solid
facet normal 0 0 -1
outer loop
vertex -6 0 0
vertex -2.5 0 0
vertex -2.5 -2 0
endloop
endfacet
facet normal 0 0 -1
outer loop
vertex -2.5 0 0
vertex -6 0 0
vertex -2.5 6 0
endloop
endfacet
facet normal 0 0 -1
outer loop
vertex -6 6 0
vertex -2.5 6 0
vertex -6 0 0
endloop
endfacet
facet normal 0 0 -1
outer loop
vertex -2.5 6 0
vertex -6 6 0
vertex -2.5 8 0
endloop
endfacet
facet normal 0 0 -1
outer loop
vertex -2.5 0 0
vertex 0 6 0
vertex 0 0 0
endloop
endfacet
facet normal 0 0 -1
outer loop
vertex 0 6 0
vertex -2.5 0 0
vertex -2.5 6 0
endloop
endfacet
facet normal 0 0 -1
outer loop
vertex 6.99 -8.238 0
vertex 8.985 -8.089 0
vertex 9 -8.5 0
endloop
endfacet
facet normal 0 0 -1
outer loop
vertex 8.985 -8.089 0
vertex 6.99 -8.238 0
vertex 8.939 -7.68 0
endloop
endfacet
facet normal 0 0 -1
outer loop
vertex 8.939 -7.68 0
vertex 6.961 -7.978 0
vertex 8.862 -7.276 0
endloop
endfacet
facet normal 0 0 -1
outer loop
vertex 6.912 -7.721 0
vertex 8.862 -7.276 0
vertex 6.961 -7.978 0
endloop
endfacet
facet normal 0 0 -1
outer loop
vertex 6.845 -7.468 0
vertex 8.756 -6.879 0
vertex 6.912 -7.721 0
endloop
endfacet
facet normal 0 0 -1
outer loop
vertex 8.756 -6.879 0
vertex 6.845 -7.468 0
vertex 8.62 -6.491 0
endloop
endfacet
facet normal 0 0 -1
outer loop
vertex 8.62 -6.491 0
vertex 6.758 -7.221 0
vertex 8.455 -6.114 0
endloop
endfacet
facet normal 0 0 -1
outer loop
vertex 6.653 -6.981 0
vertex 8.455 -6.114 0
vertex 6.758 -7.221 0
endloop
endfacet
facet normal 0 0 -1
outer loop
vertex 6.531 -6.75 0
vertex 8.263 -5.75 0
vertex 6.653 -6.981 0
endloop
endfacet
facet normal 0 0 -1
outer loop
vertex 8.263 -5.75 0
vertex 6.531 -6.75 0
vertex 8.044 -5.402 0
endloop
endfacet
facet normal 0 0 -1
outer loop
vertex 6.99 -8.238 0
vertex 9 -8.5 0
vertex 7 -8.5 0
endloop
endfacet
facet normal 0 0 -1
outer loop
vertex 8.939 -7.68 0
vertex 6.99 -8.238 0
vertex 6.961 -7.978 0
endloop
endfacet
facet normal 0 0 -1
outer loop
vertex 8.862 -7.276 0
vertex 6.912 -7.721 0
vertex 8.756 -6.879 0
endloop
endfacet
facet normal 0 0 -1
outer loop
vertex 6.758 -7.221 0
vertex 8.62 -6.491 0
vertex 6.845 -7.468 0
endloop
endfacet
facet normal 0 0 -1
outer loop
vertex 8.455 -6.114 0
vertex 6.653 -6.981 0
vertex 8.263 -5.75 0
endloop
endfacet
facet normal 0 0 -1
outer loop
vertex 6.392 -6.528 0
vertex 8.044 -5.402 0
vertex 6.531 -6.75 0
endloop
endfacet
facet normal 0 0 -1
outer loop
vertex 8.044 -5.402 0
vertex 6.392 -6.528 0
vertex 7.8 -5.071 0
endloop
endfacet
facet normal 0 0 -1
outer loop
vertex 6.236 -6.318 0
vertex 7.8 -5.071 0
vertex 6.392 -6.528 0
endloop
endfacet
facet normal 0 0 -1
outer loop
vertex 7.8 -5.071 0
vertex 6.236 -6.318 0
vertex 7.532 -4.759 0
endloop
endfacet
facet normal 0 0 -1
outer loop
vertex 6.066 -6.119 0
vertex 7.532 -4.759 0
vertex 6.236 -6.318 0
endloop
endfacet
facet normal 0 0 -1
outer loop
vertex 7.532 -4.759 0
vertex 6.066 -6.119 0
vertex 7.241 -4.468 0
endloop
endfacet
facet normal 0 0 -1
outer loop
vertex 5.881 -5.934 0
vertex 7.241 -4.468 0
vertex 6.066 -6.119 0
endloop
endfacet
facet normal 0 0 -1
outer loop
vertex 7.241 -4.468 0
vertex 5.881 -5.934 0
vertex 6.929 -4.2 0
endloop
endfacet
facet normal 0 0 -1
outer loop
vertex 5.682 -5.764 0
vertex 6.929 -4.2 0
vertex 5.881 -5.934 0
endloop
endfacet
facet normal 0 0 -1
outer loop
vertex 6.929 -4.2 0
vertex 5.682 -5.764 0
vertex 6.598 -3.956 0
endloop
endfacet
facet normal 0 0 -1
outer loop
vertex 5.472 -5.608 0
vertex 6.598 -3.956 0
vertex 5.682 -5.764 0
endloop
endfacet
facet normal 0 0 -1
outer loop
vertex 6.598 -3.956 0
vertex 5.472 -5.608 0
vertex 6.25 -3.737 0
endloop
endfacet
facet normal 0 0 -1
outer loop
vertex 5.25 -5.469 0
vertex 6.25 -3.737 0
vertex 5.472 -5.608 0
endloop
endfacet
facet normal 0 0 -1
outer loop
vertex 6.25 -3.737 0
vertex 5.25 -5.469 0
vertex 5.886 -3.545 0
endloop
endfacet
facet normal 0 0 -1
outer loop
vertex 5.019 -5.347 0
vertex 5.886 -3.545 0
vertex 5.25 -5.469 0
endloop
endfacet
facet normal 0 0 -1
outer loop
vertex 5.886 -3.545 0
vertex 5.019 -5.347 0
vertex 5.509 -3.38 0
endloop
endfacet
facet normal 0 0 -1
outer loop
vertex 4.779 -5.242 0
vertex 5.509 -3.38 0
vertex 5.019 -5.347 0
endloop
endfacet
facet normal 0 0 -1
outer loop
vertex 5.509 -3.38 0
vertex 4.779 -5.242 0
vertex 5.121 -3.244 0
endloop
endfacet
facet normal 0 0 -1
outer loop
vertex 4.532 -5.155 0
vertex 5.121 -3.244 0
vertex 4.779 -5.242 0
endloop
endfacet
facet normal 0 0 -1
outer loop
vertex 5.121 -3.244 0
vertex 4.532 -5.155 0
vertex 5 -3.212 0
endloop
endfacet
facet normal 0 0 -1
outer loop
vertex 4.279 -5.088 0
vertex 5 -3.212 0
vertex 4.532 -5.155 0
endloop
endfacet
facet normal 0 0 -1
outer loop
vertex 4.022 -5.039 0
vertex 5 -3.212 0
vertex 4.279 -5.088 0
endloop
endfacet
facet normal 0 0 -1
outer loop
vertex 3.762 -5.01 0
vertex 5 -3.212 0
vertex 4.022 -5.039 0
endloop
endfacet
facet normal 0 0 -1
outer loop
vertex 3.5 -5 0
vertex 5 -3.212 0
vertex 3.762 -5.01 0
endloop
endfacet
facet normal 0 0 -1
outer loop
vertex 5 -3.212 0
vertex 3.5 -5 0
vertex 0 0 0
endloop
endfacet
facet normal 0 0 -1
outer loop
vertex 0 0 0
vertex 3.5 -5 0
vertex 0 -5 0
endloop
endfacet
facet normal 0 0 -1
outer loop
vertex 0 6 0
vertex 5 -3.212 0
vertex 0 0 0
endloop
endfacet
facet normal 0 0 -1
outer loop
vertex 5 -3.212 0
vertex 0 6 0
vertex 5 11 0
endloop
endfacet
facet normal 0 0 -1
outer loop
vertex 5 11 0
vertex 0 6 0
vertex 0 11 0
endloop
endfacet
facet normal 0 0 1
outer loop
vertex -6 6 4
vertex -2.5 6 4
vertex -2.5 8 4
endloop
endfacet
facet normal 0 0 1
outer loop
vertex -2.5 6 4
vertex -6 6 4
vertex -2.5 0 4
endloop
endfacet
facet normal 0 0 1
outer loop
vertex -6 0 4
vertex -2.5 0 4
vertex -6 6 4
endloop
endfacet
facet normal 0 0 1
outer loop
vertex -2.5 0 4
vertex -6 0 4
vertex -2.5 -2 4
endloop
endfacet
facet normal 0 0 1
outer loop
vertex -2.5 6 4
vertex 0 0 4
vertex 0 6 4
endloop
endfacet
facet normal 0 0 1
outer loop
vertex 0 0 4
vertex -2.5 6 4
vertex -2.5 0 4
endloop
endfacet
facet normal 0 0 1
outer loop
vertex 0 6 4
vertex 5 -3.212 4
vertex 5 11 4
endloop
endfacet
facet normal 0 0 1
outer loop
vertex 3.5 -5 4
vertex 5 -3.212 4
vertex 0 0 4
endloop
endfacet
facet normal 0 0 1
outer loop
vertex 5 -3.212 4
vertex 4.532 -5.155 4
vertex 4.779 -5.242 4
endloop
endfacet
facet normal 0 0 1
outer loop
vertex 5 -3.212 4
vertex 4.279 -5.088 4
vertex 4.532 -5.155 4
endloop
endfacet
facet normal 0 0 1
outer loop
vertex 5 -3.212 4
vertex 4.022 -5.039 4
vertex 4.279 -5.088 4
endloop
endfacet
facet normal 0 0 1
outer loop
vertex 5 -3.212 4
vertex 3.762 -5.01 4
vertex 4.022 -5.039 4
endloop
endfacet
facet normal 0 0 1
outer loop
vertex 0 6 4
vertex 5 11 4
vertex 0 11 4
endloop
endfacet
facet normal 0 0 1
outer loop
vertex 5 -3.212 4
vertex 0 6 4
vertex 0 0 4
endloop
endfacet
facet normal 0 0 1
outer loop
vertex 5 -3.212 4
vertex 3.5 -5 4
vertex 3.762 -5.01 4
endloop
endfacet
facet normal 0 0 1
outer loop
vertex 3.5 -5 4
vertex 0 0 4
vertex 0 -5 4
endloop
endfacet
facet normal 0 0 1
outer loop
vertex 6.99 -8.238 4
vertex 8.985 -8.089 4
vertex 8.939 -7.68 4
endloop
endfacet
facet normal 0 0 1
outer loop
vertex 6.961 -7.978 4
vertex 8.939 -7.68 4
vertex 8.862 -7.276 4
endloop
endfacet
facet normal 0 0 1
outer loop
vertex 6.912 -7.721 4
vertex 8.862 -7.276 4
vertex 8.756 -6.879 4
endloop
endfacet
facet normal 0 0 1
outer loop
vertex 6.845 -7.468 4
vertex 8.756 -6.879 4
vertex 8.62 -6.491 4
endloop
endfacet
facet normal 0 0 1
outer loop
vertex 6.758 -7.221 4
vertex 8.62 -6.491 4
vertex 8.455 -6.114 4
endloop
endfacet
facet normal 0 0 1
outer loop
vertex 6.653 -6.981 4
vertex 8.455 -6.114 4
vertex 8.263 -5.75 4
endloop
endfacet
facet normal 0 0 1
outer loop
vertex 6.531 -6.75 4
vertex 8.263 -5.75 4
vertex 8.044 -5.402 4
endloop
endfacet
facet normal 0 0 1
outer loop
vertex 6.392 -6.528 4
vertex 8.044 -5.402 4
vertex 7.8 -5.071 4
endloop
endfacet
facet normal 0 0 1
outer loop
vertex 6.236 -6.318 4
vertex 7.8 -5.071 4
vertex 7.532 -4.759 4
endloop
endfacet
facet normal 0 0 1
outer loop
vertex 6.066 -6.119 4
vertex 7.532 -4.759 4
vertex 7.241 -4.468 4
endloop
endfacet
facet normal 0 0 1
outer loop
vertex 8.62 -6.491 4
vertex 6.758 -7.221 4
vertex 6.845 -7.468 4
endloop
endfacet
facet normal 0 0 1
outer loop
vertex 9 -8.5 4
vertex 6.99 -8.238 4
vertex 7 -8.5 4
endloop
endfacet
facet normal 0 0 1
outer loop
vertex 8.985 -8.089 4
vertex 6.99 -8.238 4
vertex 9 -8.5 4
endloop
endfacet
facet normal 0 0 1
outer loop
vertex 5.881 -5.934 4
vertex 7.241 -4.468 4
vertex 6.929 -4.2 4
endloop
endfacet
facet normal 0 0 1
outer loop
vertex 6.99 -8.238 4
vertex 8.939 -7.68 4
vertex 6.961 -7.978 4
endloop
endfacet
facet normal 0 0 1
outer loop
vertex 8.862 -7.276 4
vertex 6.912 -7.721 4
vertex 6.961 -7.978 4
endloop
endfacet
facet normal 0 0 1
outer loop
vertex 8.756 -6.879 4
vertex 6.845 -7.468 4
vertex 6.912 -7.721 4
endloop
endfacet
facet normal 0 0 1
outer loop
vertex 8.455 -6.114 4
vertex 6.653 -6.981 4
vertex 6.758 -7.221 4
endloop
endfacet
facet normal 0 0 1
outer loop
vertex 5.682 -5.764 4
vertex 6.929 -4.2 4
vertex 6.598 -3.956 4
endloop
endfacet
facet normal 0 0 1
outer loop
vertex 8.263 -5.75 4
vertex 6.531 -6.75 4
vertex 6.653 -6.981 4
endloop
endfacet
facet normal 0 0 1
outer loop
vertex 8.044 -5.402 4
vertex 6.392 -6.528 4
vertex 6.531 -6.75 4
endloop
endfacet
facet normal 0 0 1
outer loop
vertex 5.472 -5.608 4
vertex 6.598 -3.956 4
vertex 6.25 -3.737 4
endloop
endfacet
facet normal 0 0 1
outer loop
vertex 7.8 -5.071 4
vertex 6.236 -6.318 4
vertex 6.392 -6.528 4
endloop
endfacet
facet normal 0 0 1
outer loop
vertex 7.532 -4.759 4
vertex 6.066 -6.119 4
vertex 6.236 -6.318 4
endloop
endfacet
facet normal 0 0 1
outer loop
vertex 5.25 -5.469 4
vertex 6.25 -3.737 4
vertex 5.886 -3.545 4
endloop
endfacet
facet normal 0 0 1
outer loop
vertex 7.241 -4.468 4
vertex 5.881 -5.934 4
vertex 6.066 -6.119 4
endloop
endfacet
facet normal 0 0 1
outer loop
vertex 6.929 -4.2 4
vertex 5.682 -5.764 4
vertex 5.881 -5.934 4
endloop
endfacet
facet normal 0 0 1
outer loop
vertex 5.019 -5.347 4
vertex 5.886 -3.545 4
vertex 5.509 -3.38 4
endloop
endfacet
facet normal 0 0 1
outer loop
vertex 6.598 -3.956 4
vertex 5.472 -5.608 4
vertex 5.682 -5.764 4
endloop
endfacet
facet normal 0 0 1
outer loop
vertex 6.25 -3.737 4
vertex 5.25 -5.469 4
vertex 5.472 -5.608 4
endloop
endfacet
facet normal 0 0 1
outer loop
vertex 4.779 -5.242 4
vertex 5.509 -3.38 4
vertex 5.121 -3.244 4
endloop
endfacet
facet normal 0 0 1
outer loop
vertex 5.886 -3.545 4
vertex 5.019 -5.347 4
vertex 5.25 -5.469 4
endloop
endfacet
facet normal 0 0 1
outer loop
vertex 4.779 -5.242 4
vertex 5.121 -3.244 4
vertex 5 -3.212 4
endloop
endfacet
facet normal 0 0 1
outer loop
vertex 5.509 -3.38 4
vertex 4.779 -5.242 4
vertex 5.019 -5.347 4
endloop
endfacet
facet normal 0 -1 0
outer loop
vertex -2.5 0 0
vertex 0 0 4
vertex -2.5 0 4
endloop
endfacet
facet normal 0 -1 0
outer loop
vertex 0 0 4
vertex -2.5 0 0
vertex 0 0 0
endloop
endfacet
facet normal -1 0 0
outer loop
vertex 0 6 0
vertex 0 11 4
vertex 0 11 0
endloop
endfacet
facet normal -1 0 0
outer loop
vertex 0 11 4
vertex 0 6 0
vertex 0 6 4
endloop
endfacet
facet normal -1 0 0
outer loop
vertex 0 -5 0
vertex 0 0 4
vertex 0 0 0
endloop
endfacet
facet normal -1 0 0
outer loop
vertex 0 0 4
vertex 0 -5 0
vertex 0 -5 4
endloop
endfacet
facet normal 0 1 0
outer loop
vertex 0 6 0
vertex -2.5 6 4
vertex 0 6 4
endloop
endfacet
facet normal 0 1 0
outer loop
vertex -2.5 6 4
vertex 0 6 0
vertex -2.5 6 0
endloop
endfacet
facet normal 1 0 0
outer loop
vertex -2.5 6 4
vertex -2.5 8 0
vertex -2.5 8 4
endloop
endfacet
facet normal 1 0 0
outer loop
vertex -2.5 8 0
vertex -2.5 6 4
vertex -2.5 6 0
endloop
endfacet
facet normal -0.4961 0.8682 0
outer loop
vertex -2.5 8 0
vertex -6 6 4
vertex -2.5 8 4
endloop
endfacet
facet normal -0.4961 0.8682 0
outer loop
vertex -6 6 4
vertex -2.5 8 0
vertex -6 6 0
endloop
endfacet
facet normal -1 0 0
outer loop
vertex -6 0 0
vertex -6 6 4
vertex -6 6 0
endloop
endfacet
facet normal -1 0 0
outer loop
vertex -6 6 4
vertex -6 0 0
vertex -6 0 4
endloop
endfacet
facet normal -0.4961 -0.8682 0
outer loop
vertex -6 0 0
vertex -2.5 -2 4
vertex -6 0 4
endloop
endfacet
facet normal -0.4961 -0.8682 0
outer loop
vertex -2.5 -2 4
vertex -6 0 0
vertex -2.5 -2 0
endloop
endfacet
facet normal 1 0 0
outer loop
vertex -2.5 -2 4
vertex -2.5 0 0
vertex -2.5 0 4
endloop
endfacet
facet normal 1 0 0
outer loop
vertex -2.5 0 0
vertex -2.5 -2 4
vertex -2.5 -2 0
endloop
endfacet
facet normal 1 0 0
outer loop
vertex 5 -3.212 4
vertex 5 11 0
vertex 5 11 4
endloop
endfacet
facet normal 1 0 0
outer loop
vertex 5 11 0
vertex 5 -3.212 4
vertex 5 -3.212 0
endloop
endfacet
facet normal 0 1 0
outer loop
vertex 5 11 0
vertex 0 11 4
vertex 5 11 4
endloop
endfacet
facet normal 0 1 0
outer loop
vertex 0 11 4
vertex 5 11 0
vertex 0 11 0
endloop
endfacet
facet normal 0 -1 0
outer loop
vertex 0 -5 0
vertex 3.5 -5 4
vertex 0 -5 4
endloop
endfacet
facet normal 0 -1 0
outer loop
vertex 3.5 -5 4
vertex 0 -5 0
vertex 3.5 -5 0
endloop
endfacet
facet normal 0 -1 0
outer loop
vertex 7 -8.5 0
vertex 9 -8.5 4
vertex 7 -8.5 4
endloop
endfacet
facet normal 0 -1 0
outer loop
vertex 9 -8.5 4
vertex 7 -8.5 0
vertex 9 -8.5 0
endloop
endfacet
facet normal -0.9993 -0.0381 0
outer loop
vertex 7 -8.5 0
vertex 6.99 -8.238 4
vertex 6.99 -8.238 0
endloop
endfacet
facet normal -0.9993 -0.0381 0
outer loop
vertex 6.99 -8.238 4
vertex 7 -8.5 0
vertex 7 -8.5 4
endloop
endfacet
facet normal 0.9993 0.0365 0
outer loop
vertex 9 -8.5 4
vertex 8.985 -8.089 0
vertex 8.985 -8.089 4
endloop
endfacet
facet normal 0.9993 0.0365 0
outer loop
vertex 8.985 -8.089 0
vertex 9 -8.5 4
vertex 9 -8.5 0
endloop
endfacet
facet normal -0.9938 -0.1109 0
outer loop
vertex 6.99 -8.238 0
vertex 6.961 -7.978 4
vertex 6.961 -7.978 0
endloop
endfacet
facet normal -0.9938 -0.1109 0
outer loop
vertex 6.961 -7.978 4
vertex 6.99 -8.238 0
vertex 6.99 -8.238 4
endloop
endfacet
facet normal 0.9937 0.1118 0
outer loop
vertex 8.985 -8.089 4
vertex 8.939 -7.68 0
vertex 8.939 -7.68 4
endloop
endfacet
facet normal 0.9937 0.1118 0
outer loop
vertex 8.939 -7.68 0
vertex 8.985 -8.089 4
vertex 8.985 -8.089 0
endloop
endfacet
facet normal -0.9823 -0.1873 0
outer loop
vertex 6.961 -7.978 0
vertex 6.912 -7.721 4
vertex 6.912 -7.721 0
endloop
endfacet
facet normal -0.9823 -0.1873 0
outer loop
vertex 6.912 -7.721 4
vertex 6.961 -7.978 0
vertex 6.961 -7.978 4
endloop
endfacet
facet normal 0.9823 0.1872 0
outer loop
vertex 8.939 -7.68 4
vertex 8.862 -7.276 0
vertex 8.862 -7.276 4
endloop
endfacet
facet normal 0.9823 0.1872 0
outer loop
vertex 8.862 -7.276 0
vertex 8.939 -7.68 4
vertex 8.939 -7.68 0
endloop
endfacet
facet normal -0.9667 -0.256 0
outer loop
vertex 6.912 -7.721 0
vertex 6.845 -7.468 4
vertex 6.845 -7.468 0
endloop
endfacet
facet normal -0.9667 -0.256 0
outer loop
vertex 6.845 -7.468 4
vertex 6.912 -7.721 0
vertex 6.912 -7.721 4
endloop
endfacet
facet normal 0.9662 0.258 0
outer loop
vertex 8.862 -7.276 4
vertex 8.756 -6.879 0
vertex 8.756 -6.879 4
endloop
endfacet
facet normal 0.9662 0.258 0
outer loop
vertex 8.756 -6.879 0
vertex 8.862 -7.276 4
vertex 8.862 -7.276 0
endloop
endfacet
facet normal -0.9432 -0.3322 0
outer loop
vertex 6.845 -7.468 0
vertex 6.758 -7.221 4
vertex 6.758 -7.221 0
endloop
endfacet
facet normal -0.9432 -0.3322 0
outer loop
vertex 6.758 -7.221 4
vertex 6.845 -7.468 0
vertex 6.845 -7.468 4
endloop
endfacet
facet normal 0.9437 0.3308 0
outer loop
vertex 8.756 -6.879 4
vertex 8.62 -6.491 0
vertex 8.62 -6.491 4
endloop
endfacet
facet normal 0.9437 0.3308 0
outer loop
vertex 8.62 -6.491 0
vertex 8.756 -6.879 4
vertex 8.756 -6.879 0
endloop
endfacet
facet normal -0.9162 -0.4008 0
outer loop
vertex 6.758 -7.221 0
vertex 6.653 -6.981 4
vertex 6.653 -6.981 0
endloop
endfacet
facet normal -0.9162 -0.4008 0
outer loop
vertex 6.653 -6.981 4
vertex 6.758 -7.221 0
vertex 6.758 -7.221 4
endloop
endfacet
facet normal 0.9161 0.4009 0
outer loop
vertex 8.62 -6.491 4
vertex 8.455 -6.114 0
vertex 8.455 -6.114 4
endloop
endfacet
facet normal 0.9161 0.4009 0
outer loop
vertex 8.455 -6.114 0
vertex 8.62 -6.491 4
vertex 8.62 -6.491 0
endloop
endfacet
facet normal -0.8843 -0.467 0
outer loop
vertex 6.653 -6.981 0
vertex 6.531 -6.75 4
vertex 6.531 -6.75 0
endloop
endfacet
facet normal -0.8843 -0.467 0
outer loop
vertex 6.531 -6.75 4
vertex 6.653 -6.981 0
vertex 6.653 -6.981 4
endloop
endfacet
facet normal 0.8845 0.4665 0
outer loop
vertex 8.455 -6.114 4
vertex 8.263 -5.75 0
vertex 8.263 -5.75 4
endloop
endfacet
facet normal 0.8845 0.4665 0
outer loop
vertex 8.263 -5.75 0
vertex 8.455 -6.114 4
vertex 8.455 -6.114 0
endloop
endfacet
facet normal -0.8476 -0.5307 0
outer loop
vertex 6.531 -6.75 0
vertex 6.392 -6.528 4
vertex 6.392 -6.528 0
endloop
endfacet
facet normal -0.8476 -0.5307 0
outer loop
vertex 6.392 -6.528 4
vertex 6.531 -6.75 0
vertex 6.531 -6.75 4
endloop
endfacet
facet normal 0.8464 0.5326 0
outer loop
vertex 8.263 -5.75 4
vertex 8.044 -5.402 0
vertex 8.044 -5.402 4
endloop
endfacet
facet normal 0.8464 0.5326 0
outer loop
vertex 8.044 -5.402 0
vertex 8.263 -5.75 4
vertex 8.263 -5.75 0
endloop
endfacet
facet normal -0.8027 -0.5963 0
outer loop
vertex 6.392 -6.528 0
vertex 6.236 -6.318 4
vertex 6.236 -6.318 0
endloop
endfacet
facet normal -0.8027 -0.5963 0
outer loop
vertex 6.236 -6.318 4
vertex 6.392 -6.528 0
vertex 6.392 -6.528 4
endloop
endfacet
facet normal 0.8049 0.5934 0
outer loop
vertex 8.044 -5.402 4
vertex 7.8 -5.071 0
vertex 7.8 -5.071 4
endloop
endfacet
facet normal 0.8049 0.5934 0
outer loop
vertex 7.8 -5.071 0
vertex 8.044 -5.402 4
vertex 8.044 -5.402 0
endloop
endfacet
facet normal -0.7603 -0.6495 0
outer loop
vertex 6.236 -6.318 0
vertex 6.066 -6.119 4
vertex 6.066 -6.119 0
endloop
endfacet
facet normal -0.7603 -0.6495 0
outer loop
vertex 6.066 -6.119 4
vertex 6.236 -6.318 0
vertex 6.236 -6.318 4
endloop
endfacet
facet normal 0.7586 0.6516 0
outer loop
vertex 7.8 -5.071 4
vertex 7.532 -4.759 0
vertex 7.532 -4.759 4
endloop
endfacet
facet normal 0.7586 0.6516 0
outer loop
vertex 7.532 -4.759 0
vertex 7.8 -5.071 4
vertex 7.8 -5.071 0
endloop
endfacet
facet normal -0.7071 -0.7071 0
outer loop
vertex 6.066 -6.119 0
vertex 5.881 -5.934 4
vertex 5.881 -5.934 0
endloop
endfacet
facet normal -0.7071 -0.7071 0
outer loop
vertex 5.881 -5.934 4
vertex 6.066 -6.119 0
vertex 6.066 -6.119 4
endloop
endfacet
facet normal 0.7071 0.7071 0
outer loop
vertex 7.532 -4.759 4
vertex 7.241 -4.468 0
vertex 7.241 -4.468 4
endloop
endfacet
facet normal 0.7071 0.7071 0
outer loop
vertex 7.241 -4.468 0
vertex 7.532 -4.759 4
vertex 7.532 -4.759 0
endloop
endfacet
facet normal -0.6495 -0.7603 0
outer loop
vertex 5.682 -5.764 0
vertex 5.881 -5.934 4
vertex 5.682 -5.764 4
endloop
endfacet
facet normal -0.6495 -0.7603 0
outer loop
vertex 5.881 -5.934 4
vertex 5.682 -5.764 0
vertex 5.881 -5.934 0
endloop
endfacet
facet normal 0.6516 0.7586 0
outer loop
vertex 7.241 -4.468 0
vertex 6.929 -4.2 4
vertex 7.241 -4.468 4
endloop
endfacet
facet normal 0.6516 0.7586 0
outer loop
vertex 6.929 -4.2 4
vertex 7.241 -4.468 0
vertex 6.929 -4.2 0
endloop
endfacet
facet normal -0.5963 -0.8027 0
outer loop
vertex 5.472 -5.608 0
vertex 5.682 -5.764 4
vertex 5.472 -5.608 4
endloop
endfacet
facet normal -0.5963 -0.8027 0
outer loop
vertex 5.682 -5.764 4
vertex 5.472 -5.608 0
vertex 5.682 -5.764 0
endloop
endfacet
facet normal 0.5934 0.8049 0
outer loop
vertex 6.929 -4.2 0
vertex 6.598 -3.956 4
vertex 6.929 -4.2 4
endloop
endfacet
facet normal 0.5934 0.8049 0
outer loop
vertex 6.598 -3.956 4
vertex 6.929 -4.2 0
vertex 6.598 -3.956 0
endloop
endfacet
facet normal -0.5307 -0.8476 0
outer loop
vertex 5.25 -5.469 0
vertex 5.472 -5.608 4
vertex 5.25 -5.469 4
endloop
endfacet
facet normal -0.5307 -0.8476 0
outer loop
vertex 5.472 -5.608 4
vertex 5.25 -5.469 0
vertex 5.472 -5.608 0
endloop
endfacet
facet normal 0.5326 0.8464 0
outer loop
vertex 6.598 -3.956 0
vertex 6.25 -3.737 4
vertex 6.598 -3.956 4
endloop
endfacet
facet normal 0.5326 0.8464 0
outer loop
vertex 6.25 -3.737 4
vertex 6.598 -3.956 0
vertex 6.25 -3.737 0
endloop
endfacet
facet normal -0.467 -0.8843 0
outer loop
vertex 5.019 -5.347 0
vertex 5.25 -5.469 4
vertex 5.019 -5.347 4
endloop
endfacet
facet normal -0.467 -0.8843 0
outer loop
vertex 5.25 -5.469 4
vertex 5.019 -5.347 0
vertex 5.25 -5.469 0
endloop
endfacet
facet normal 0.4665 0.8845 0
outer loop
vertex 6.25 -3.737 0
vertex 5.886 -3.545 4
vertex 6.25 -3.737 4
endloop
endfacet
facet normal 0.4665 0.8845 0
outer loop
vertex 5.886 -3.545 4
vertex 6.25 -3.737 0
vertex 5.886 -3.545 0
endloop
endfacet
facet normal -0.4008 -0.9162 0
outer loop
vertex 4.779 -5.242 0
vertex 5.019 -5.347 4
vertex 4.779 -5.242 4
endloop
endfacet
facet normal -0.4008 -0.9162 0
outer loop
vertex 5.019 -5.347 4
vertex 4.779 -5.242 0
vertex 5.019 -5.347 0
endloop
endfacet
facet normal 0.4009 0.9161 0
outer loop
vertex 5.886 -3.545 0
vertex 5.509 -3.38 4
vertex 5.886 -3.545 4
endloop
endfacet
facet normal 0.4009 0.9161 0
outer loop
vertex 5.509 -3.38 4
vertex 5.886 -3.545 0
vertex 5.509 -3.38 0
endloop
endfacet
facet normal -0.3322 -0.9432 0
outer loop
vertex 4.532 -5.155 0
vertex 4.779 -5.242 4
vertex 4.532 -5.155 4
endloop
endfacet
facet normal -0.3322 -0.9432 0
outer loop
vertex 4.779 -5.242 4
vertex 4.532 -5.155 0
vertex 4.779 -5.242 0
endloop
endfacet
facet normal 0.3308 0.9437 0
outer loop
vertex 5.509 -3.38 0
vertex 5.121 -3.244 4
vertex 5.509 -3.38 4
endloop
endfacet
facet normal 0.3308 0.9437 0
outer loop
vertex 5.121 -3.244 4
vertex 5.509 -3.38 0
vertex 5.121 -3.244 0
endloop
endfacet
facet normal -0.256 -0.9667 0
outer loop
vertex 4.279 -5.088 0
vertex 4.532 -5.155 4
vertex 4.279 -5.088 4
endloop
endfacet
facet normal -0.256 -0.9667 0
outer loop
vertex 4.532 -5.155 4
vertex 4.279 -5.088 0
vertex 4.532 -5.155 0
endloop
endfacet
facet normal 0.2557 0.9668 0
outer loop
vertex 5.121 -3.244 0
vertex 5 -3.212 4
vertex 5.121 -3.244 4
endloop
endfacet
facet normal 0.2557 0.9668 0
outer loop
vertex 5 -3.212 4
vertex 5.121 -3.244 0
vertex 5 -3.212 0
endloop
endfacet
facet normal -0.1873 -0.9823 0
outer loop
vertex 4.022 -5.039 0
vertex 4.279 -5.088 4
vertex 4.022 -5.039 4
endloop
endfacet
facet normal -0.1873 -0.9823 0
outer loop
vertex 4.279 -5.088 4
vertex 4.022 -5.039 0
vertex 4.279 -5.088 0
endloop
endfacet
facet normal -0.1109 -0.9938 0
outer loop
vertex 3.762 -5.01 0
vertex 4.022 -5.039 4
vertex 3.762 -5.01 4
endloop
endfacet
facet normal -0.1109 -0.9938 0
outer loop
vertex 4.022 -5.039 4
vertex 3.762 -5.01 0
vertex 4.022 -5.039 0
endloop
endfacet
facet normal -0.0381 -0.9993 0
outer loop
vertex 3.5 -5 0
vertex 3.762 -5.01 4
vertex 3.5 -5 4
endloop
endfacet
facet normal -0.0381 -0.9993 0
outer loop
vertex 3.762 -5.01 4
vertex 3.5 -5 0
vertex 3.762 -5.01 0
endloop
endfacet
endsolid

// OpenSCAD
$fa=1;
$fs=0.4;

module hook() {
    polygon([
        [0,0],
        [-2.5, 0],
        [-2.5, -2],
        [-6, 0],
        [-6, 6],
        [-2.5, 8],
        [-2.5, 6],
        [0, 6]
    ]);
}
height=4;
linear_extrude(height=height) hook();
translate([0,-5,0]) resize([5,16,height]) cube(1);
translate([3.5, -8.5, 0])
    rotate_extrude(angle=90)
    translate([5.5, 0, 0])
    rotate([0, 0, 90])
    square([height, 2]);
